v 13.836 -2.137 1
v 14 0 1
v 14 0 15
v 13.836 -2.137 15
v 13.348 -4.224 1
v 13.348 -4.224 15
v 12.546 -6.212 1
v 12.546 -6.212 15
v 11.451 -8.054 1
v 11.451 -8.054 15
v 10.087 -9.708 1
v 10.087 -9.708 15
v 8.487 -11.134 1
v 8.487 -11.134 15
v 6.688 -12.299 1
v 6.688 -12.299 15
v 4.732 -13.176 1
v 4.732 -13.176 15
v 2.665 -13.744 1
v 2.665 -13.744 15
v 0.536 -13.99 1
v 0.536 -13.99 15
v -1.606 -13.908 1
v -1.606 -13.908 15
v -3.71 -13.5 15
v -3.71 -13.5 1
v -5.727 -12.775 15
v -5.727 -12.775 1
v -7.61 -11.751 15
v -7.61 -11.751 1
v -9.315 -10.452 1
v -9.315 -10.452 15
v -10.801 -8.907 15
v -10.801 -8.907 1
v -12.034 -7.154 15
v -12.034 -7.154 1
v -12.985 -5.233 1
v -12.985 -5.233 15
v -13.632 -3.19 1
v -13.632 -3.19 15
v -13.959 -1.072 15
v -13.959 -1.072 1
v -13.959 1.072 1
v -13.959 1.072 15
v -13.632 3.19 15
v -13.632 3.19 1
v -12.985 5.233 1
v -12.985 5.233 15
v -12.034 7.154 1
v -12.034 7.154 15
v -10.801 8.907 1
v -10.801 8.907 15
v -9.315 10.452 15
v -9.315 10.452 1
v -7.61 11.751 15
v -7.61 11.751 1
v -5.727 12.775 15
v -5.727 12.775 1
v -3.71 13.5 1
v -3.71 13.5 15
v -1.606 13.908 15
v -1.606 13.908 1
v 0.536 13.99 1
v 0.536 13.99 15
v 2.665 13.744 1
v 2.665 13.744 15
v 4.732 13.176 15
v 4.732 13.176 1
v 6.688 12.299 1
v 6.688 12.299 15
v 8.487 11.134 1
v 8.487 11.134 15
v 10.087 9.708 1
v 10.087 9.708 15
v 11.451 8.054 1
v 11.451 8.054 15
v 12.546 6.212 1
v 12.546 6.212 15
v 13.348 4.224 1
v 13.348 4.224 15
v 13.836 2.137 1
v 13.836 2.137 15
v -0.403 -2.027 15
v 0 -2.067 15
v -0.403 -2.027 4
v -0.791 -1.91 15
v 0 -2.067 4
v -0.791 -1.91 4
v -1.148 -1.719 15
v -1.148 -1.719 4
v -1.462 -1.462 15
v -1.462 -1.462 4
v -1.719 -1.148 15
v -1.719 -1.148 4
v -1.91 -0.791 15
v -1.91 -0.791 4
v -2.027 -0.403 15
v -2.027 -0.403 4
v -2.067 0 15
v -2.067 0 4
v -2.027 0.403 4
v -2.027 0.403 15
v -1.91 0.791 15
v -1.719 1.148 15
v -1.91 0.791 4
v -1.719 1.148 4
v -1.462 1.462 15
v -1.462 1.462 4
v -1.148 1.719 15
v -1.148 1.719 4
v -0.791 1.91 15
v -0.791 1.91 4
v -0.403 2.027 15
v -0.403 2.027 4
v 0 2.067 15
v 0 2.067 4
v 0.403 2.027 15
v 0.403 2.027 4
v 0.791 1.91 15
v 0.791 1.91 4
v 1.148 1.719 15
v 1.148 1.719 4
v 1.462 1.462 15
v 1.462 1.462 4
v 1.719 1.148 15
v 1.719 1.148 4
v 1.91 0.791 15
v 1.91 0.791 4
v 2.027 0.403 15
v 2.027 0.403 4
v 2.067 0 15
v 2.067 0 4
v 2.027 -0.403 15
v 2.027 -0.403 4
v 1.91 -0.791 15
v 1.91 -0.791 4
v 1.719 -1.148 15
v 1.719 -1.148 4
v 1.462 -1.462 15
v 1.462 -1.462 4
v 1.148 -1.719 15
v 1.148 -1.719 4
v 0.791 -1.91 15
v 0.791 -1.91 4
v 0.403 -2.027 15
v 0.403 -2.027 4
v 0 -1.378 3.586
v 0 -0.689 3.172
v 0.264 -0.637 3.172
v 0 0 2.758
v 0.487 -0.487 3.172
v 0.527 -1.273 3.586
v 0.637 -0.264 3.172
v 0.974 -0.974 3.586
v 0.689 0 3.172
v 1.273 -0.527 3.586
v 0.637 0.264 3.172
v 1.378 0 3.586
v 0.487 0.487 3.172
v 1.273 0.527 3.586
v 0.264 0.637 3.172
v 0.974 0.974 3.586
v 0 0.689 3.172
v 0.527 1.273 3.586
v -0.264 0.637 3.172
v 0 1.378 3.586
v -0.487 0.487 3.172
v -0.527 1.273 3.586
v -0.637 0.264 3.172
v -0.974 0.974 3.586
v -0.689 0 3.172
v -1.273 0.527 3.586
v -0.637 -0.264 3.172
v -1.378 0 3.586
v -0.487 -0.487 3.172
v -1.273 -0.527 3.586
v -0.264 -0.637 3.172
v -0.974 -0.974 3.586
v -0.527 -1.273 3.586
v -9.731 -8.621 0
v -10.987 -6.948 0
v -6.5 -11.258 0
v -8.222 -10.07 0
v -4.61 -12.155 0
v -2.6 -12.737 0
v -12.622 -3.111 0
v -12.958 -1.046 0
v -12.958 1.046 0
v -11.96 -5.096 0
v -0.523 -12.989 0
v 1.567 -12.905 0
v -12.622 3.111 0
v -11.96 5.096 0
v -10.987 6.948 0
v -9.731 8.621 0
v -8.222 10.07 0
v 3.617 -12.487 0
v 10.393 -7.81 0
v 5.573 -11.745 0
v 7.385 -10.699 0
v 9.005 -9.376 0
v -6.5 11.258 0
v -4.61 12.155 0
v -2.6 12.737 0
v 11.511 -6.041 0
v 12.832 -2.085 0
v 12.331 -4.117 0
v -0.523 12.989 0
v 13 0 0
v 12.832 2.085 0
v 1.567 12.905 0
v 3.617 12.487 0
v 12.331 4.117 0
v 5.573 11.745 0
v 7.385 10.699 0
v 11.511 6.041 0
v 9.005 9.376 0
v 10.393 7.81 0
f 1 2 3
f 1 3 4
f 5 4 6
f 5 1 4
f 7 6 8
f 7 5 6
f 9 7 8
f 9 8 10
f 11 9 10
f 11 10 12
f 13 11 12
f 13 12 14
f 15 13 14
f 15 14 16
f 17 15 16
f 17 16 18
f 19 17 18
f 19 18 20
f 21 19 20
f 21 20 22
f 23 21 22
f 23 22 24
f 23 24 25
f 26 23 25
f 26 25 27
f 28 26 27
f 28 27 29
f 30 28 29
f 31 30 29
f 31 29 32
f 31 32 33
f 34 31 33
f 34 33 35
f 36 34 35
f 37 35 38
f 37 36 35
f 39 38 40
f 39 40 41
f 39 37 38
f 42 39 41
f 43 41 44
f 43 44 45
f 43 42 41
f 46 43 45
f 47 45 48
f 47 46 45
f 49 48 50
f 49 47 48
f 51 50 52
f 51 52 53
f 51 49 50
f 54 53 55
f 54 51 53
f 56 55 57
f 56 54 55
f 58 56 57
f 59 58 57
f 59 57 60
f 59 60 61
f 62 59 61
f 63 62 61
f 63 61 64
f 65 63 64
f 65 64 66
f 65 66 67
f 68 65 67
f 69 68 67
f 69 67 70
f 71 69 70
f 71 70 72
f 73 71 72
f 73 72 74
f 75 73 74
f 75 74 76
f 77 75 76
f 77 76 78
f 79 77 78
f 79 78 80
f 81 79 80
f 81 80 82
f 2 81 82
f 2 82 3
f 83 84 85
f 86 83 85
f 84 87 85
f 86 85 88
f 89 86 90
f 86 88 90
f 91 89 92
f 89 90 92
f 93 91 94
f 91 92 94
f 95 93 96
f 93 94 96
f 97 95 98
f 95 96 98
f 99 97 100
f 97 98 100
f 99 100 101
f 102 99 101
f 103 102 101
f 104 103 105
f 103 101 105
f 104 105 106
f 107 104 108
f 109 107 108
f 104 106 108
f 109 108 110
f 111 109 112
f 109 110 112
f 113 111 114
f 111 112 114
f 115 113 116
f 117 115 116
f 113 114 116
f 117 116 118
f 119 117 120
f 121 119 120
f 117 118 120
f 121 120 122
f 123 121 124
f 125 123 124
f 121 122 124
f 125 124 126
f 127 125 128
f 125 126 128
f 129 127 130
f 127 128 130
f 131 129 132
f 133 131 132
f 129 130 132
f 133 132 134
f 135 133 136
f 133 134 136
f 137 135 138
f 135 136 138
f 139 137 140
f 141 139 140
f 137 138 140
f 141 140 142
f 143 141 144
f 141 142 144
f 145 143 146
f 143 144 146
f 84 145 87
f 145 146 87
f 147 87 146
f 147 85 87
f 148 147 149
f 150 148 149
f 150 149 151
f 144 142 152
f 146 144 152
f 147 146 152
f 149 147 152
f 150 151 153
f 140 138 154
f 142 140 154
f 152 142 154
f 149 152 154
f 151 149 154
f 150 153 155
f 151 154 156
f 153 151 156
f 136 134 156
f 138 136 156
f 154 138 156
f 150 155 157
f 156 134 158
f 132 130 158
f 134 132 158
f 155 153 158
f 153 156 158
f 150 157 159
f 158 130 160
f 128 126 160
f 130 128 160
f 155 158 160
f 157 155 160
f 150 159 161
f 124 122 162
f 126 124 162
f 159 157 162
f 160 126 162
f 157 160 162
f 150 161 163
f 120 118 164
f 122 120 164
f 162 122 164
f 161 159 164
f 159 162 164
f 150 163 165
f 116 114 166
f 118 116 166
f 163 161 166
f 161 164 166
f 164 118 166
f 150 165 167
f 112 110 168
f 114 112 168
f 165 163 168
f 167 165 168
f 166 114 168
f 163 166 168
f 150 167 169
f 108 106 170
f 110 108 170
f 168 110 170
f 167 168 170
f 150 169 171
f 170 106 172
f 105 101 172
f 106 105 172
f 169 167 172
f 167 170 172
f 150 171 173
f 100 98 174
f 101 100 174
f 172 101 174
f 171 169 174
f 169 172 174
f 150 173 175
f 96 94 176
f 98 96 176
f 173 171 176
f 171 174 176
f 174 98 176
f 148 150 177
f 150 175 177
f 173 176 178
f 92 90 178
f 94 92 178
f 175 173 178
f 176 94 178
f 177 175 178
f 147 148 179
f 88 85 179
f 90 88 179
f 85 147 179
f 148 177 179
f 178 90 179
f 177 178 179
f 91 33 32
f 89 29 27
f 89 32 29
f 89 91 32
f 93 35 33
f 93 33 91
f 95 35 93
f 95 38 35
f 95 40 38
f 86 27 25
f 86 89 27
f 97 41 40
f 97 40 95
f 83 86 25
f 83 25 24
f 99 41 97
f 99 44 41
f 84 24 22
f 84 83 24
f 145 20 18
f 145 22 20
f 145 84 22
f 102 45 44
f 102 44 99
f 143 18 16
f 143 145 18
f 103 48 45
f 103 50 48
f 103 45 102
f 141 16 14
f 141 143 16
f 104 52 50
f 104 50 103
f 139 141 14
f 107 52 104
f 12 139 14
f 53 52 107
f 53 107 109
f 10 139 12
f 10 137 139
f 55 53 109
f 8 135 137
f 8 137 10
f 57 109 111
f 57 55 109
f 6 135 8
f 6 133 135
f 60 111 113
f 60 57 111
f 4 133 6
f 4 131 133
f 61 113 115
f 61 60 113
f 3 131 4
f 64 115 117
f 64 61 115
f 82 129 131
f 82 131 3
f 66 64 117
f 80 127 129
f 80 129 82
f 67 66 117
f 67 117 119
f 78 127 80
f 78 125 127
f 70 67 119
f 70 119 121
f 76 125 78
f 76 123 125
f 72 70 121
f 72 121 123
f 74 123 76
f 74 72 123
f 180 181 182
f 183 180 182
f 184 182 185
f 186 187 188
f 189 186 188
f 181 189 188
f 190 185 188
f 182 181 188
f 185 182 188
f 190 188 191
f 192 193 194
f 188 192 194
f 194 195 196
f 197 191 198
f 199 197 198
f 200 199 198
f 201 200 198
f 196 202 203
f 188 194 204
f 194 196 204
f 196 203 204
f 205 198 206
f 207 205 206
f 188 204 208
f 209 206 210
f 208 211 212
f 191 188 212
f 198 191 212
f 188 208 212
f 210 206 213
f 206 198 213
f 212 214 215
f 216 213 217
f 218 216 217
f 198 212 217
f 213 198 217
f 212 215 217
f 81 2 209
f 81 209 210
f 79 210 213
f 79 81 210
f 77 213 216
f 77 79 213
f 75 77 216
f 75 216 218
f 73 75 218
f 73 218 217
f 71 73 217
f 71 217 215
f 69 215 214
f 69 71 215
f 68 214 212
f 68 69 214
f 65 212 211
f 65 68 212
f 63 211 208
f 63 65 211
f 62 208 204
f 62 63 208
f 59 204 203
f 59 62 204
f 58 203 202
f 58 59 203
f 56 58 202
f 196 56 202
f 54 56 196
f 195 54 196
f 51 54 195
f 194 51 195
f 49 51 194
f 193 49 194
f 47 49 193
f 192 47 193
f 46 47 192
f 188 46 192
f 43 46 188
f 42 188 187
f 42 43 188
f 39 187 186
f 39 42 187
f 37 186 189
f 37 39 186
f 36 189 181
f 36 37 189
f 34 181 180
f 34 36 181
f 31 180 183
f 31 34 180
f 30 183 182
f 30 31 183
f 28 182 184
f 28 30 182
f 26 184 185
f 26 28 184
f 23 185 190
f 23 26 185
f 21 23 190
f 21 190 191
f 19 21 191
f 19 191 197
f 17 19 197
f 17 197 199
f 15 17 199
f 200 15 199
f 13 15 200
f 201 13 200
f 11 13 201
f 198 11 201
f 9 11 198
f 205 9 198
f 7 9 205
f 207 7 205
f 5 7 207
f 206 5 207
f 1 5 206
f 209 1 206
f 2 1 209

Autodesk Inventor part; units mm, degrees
ref_plane "YZ Plane" through (0, 0, 0) normal (1, 0, 0) x (0, 1, 0)
ref_plane "XZ Plane" through (0, 0, 0) normal (0, 1, 0) x (-1, 0, 0)
ref_plane "XY Plane" through (0, 0, 0) normal (0, 0, 1) x (1, 0, 0)
sketch "Skizze1" plane through (0, 0, 0) normal (0, 0, 1) x (1, 0, 0)
  line L0 (-19.6, 0) -> (19.6, 0) projected
  line L1 (0, -19.6) -> (0, 19.6) projected
  circle A0 centre (0, 0) radius 14
  dimension "d0" = 28
extrude "Extrusion1" add sketch "Skizze1" along normal blind 15
chamfer "Fase1" distance 1 angle 45 1 edges at (-14, 0, 0)
sketch "Skizze2" plane through (0, 0, 15) normal (0, 0, 1) x (1, 0, 0)
  point P0 (0, 0)
  point P1 (0, 0)
hole "Bohrung1" at (0, 0, 15) direction (0, 0, -1) diameter 4.134 depth 11 tip angle 118 thread size "M5x0.8" class "6H" standard "ISO Metric profile"
properties part number "Gummistopl klein"
